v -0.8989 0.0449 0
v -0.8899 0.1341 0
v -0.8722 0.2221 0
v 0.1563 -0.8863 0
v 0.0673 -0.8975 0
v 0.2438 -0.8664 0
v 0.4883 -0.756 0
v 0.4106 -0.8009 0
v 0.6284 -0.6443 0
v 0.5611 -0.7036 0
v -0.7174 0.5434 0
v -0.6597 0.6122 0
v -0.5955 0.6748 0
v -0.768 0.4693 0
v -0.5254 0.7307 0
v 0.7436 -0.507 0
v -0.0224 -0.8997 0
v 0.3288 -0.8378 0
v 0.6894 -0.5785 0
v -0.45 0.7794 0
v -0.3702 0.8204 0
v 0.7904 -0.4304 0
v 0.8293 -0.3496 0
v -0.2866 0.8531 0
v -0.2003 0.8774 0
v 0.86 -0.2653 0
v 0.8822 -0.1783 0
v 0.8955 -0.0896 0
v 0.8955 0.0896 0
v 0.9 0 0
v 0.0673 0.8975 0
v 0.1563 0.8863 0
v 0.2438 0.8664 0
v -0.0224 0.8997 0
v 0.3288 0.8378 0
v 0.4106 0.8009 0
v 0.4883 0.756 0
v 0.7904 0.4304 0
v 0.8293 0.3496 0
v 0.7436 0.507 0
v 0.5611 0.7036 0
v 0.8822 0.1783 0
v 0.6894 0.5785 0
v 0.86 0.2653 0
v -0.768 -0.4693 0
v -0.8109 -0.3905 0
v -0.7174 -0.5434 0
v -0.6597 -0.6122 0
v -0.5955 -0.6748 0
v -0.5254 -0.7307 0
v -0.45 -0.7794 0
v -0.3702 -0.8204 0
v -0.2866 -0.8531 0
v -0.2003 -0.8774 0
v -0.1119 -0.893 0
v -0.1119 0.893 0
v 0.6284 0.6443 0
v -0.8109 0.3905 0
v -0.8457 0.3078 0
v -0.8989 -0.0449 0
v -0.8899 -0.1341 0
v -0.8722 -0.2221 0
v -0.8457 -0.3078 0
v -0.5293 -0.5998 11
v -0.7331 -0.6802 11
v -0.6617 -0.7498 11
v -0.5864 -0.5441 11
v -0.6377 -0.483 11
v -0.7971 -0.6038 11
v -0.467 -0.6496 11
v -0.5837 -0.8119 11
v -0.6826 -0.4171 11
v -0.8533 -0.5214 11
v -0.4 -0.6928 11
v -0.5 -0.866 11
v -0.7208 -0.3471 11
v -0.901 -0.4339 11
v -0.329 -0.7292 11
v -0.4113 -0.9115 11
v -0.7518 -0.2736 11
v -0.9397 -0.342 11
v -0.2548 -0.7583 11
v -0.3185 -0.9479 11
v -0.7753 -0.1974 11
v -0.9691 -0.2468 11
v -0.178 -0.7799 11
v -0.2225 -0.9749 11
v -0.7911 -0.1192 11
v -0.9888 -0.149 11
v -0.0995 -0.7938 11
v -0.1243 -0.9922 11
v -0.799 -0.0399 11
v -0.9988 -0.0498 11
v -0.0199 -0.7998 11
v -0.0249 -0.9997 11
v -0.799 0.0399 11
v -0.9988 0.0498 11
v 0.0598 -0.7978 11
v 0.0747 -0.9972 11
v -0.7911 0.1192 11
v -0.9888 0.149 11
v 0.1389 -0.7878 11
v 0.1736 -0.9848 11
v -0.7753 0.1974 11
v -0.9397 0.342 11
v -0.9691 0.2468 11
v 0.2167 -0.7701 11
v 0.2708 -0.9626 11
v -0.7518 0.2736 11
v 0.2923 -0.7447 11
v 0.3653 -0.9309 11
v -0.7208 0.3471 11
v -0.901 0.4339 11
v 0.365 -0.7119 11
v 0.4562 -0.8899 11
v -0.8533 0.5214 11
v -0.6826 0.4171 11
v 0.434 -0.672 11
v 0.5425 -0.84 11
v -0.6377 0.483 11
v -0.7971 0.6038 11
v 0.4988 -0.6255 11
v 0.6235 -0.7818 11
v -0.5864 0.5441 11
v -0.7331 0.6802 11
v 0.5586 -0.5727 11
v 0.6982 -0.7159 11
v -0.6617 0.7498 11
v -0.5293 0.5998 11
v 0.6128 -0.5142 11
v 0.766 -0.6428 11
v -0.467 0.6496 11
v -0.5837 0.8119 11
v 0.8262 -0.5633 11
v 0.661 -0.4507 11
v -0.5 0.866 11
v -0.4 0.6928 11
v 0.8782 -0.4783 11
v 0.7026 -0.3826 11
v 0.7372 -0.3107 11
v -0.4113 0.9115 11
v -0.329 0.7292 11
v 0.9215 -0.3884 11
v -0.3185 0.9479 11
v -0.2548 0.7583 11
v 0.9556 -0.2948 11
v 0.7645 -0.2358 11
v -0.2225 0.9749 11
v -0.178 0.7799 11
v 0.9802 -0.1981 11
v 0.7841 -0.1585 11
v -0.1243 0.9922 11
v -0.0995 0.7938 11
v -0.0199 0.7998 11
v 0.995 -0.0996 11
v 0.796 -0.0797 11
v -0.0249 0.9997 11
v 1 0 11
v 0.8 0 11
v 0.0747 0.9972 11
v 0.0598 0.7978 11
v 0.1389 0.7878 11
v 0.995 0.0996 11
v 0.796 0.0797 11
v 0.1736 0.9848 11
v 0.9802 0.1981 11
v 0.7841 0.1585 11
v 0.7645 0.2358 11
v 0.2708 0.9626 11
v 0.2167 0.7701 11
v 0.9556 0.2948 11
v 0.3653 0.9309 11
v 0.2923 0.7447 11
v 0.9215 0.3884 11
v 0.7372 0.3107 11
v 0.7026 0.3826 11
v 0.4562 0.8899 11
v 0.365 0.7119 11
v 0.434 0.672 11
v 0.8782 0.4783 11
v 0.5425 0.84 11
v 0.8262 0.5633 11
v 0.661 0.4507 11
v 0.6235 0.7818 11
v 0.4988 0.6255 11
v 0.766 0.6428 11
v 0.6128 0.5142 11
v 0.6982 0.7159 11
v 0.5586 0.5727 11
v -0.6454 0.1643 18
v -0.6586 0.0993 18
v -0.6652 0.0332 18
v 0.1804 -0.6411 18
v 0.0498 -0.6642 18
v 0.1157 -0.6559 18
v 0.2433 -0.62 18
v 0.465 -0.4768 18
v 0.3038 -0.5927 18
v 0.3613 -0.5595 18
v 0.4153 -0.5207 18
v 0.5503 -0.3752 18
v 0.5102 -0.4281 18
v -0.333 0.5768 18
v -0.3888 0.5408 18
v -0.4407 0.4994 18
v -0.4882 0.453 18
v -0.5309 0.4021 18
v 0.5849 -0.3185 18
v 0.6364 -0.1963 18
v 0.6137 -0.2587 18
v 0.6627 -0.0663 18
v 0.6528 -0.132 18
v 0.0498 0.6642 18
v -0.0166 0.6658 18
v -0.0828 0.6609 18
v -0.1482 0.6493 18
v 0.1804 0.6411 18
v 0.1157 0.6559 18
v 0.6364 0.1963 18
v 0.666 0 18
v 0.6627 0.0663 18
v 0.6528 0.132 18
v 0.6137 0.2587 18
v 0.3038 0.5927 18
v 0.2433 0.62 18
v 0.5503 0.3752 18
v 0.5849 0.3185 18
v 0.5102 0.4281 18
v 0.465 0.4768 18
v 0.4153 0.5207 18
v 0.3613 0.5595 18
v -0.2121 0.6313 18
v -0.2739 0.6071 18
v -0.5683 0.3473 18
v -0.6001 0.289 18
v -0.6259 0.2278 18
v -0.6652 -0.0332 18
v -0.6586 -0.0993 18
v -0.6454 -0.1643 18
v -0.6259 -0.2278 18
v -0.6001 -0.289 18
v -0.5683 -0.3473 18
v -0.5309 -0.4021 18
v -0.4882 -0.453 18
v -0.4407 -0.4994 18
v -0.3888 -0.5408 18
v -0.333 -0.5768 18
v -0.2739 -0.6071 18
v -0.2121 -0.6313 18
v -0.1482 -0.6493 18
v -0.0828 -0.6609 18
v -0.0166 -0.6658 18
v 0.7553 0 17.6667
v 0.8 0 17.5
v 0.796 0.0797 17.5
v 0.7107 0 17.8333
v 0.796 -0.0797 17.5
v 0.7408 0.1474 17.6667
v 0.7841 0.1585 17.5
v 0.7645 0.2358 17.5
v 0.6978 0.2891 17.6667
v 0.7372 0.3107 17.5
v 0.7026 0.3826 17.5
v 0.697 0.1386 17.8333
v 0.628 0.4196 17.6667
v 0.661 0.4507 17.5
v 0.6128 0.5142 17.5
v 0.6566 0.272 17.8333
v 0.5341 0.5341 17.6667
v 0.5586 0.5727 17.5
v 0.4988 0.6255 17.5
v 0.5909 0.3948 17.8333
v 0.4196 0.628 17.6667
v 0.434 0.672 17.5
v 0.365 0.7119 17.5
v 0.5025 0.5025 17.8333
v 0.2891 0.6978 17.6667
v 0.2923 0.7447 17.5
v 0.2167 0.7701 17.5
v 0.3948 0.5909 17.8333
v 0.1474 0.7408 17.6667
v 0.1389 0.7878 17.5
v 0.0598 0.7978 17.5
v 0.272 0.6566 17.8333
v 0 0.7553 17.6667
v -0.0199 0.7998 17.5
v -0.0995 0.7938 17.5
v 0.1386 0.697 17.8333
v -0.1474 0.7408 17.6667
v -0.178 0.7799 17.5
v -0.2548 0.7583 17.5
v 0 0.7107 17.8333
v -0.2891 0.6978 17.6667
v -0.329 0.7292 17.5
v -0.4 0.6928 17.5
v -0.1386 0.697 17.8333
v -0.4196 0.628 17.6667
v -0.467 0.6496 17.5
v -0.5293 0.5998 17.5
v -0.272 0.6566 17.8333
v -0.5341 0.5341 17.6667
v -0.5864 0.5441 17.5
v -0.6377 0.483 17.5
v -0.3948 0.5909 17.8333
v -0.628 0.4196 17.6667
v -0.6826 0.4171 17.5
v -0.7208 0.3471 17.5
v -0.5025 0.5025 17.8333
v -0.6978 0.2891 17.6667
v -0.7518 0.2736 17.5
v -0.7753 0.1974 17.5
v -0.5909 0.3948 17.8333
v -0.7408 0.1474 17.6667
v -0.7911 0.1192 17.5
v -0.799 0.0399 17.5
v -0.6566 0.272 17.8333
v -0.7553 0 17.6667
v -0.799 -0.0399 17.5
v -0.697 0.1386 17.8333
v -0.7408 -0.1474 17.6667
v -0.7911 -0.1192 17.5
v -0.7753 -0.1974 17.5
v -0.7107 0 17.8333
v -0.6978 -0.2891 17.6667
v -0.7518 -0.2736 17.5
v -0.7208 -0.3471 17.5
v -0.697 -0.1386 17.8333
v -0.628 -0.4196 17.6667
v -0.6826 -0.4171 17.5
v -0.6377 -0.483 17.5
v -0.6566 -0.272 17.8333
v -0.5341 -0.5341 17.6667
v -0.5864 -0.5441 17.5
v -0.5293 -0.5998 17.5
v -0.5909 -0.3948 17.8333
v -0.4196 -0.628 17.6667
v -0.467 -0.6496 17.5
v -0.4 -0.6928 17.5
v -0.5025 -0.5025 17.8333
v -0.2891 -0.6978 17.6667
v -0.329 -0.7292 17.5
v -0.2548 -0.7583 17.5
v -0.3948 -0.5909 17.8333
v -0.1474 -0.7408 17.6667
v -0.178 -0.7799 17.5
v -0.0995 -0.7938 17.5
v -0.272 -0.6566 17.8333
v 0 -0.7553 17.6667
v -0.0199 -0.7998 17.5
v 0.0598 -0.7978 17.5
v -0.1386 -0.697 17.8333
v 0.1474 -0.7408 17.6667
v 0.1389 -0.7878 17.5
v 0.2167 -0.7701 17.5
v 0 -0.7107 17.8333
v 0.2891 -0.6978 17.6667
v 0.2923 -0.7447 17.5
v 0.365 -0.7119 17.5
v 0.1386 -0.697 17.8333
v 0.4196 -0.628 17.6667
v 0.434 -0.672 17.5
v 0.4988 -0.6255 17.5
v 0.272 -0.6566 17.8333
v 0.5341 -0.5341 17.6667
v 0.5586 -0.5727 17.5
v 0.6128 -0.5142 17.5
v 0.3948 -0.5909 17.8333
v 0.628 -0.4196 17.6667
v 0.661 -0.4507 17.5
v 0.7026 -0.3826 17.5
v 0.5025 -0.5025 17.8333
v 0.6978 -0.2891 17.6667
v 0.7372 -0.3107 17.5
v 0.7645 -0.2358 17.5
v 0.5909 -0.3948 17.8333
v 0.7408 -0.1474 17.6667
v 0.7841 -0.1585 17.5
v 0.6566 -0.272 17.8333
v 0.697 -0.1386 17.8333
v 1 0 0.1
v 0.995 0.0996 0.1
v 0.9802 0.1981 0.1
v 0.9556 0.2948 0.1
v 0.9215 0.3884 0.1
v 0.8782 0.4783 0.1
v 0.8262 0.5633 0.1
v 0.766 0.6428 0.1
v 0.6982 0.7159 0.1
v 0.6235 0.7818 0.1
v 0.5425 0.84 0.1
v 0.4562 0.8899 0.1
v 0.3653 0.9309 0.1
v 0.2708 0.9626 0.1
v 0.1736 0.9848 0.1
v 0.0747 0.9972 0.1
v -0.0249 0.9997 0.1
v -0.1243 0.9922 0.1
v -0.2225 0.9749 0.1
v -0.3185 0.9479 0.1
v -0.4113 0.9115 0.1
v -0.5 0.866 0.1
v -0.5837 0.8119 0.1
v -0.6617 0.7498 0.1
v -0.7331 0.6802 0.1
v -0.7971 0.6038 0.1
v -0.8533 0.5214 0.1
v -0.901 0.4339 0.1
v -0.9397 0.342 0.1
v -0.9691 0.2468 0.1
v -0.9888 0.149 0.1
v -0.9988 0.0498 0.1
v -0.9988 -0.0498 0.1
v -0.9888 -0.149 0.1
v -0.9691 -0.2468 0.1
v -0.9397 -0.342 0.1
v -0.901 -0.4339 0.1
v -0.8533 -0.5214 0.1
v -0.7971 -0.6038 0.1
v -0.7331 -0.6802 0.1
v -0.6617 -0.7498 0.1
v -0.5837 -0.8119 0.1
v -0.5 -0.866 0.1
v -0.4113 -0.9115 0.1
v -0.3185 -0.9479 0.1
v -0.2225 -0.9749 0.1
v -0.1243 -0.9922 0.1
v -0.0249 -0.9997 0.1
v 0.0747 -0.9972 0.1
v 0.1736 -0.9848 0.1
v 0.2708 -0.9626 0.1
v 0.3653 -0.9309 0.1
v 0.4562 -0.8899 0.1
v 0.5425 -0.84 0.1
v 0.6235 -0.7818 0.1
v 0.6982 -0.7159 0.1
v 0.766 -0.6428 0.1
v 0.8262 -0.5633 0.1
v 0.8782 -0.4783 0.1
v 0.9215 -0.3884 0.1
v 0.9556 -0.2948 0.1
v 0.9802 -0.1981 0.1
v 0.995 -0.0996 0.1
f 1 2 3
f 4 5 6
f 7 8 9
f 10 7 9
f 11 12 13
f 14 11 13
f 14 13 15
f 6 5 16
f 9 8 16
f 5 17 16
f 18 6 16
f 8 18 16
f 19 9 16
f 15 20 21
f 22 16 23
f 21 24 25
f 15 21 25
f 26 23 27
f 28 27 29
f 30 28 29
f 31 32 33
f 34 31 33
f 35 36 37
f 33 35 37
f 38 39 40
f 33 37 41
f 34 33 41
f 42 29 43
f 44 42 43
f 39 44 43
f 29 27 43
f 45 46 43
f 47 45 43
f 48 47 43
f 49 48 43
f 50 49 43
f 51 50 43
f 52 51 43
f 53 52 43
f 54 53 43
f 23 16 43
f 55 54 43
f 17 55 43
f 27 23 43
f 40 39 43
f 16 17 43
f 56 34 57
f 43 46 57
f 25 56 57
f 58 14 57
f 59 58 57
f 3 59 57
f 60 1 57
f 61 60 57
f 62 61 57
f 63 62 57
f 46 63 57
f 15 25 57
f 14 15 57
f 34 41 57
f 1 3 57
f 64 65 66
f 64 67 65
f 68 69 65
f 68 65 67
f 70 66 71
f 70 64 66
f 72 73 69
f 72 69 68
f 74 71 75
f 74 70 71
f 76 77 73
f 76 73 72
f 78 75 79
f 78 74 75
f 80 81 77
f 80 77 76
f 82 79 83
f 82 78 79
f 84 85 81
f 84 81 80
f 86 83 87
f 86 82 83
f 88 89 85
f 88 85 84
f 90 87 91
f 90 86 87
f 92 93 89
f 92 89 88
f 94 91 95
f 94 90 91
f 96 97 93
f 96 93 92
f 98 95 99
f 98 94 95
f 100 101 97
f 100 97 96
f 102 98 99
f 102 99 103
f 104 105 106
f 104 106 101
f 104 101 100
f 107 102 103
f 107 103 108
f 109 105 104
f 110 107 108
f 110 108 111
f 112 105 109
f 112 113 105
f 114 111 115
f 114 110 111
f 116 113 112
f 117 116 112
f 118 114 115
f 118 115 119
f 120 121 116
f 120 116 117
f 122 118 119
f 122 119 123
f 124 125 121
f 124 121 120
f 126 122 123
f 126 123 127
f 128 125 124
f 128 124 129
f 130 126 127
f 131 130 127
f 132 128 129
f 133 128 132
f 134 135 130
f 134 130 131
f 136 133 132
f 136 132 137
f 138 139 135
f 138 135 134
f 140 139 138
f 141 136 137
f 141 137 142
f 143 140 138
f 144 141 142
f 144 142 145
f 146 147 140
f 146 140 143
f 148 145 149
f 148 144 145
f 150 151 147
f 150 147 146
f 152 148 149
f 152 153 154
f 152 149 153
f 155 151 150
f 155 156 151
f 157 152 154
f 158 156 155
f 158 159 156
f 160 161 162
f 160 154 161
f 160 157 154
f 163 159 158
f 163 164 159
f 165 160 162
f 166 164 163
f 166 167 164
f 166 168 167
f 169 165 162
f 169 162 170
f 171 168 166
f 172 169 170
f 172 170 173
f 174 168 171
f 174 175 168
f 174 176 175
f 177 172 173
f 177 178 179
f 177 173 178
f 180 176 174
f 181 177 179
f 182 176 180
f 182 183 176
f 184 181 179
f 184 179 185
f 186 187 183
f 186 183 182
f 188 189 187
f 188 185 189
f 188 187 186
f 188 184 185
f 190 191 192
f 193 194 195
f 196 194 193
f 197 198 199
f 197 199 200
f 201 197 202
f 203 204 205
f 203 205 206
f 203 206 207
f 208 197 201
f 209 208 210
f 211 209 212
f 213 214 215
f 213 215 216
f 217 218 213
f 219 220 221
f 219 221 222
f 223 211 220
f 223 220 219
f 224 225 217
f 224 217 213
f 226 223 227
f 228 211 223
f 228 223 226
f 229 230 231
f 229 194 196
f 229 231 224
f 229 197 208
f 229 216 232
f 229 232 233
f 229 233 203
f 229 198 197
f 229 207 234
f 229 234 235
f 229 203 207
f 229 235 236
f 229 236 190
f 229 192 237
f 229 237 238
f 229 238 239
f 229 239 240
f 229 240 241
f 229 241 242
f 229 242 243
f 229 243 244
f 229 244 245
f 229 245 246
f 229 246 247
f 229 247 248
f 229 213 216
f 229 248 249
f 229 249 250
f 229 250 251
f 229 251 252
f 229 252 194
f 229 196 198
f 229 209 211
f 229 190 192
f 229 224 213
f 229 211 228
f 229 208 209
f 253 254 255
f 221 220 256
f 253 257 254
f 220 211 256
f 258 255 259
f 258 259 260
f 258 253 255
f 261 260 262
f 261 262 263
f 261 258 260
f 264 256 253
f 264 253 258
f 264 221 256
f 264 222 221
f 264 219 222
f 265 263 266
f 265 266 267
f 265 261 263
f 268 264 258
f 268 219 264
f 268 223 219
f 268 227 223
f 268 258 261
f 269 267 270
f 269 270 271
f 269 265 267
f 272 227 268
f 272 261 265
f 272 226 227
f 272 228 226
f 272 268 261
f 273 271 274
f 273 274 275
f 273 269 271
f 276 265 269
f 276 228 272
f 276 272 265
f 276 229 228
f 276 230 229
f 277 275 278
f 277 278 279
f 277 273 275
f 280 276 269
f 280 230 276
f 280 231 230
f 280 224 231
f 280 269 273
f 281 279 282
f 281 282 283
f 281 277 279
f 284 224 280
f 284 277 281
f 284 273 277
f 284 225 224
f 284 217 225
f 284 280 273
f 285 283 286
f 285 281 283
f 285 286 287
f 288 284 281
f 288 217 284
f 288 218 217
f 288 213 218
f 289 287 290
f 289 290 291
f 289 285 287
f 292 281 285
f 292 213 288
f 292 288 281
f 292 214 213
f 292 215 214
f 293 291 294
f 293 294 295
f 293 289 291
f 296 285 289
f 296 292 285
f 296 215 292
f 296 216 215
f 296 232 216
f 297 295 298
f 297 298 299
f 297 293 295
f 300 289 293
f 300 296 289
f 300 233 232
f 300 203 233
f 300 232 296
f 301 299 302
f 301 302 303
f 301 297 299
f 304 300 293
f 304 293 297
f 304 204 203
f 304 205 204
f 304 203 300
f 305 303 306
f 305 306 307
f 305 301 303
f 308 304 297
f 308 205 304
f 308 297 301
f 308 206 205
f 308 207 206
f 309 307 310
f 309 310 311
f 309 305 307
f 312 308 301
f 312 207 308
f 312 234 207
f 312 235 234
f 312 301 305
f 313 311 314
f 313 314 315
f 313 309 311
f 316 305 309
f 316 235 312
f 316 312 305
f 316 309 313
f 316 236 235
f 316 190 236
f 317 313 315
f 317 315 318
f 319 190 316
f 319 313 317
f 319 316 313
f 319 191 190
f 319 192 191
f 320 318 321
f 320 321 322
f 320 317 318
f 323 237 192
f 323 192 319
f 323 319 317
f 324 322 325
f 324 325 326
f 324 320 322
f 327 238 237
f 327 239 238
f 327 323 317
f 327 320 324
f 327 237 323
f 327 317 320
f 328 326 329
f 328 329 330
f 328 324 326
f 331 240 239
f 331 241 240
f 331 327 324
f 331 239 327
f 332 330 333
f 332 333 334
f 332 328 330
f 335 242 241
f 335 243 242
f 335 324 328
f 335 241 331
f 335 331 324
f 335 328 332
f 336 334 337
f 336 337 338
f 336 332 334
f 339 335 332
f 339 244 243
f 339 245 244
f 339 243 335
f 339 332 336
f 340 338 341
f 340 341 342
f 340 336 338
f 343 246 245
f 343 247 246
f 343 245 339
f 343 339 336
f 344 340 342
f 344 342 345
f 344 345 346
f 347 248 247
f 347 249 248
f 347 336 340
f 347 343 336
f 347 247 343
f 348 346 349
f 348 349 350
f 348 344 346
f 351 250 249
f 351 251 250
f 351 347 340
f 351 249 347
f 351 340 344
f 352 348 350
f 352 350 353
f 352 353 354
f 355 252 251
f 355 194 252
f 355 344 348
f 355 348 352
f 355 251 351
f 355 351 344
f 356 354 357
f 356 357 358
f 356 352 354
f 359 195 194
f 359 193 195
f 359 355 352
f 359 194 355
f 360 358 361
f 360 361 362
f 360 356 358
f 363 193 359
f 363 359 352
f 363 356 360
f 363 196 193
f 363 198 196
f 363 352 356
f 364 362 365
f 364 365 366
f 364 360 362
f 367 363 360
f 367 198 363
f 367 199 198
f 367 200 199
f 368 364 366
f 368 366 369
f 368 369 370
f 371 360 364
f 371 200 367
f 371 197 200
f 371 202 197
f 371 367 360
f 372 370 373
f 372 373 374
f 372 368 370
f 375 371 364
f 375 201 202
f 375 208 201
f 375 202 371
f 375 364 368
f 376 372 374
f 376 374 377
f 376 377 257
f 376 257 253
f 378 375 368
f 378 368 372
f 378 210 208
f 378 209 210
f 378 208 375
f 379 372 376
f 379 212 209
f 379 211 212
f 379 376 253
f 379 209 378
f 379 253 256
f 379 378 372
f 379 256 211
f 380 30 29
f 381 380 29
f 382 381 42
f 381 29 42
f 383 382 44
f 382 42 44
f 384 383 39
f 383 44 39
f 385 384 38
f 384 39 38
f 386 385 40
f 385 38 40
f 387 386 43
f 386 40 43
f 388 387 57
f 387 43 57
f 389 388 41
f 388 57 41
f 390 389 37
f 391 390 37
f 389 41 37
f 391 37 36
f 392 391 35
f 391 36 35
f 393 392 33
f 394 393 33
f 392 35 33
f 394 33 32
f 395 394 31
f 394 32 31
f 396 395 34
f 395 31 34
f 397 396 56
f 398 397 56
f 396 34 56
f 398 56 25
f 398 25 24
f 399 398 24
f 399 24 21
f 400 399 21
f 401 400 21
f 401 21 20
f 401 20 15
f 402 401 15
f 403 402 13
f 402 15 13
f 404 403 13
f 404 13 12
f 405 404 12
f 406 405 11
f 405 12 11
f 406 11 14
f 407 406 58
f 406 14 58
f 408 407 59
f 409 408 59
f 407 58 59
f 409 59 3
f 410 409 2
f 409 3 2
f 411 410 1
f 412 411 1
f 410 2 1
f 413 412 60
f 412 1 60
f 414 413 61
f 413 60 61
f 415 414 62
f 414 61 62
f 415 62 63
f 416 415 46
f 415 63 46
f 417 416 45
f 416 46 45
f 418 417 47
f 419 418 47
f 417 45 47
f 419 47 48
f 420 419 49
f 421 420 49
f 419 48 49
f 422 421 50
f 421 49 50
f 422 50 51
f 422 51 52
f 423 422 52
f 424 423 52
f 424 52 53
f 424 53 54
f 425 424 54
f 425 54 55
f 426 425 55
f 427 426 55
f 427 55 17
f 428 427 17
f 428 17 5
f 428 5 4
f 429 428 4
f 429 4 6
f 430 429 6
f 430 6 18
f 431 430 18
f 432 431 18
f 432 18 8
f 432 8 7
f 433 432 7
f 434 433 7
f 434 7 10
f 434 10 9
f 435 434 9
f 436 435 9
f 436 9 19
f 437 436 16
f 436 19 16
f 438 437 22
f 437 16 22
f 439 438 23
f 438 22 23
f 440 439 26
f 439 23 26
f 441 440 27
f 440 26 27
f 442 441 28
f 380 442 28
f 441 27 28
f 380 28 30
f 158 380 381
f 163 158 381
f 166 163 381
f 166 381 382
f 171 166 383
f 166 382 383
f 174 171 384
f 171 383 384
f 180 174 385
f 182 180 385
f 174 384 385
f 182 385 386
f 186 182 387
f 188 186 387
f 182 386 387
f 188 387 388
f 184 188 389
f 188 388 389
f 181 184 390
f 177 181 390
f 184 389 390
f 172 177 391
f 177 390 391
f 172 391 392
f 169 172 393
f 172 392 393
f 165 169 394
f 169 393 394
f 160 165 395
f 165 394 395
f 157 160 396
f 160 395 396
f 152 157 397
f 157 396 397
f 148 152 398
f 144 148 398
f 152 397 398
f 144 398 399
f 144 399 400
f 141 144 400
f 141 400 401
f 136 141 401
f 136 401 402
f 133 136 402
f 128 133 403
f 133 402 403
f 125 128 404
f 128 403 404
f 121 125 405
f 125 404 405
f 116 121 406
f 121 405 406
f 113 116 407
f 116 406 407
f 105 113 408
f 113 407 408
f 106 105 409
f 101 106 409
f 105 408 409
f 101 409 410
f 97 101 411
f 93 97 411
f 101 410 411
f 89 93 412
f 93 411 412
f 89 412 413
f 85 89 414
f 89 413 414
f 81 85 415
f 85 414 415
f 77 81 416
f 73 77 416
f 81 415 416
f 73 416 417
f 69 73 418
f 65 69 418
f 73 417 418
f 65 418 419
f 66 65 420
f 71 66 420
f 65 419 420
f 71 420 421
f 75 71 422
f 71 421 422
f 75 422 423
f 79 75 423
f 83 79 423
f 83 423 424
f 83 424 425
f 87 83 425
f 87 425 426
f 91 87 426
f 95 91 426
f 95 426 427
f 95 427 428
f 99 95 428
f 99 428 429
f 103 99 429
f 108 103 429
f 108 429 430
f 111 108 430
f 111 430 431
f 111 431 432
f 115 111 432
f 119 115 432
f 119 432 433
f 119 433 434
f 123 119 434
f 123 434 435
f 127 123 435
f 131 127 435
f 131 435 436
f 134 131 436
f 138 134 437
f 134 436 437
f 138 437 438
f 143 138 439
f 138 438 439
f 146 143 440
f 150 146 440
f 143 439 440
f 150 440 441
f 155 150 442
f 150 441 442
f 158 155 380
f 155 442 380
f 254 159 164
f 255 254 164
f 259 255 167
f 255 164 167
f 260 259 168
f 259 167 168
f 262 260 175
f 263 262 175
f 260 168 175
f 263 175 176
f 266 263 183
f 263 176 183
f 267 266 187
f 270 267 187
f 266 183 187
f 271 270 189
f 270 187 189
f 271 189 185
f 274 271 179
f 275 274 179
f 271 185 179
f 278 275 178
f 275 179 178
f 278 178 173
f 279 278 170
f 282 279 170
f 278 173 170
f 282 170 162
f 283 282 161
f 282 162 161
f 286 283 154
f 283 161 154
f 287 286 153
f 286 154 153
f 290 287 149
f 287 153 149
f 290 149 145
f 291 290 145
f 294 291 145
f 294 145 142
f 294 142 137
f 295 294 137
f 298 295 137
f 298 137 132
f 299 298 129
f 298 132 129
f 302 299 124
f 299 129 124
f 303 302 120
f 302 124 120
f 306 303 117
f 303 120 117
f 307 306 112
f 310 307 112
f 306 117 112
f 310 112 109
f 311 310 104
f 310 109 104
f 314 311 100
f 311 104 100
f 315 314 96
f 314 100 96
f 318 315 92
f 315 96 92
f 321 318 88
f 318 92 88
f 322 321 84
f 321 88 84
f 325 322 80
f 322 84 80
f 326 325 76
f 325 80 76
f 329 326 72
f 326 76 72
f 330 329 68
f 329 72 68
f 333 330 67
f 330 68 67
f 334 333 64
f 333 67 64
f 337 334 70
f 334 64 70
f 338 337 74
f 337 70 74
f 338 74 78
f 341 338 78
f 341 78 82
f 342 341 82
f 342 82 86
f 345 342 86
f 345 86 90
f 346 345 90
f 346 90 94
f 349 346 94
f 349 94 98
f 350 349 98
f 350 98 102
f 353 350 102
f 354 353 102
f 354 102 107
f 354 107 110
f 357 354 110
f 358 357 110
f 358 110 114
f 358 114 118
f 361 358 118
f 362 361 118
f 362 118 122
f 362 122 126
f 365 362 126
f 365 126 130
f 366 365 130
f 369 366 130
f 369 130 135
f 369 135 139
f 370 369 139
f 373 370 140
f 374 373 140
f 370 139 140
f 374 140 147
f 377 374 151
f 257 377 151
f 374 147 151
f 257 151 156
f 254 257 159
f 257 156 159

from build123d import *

# Parameters (mm, degrees)
F0_R     = 1
F1_DEPTH = 11
F2_R     = 0.8
F3_DEPTH = 7
F4_SIZE  = 0.1
F5_SIZE2 = 0.133975
F5_SIZE  = 0.5


with BuildPart() as f1:
    # F0 (on Top) → F1 (new body)
    with BuildSketch(Plane.XY):
        Circle(F0_R)
    extrude(amount=F1_DEPTH)

    # F2 (on face) → F3 (join)
    with BuildSketch(Plane.XY.offset(11)):
        Circle(F2_R)
    extrude(amount=F3_DEPTH)

    # F4
    f4_edges = [f1.edges().sort_by_distance(p)[0] for p in [
        (-1, 0, 0),
    ]]
    chamfer(f4_edges, length=F4_SIZE)

    # F5
    f5_edges = [f1.edges().sort_by_distance(p)[0] for p in [
        (-0.8, 0, 18),
    ]]
    chamfer(f5_edges, length=F5_SIZE, length2=F5_SIZE2)


solid = f1.part
